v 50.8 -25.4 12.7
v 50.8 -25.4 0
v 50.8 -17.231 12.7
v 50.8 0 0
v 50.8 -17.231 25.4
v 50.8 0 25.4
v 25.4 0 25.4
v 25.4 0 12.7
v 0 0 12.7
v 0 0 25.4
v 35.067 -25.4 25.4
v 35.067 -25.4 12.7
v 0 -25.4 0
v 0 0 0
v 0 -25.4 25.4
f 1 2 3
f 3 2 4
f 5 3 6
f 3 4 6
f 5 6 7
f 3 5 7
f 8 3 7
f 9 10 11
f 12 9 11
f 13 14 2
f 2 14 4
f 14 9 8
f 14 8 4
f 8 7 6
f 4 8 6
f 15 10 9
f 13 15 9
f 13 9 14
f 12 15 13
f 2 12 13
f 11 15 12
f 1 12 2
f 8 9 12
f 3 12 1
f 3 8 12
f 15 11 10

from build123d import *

# Parameters (mm, degrees)
F0_W     = 12.7
F0_H     = 12.7
F1_DEPTH = 25.4
F3_DEPTH = 12.7


with BuildPart() as f1:
    # F0 (on Front) → F1 (new body)
    with BuildSketch(Plane.XZ):
        Polygon((0, 25.4), (0, 0), (50.8, 0), (50.8, 12.7), (38.1, 12.7), (38.1, 25.4), align=None)
        with Locations((44.45, 19.05)):
            Rectangle(F0_W, F0_H)
    extrude(amount=F1_DEPTH)

    # F2 (on face) → F3 (cut, symmetric)
    with BuildSketch(Plane.XY.offset(25.4)):
        Polygon((25.4, 0), (0, 0), (35.067357, -25.4), (50.8, -25.4), (50.8, -17.231373), align=None)
    extrude(amount=F3_DEPTH, both=True, mode=Mode.SUBTRACT)


solid = f1.part
